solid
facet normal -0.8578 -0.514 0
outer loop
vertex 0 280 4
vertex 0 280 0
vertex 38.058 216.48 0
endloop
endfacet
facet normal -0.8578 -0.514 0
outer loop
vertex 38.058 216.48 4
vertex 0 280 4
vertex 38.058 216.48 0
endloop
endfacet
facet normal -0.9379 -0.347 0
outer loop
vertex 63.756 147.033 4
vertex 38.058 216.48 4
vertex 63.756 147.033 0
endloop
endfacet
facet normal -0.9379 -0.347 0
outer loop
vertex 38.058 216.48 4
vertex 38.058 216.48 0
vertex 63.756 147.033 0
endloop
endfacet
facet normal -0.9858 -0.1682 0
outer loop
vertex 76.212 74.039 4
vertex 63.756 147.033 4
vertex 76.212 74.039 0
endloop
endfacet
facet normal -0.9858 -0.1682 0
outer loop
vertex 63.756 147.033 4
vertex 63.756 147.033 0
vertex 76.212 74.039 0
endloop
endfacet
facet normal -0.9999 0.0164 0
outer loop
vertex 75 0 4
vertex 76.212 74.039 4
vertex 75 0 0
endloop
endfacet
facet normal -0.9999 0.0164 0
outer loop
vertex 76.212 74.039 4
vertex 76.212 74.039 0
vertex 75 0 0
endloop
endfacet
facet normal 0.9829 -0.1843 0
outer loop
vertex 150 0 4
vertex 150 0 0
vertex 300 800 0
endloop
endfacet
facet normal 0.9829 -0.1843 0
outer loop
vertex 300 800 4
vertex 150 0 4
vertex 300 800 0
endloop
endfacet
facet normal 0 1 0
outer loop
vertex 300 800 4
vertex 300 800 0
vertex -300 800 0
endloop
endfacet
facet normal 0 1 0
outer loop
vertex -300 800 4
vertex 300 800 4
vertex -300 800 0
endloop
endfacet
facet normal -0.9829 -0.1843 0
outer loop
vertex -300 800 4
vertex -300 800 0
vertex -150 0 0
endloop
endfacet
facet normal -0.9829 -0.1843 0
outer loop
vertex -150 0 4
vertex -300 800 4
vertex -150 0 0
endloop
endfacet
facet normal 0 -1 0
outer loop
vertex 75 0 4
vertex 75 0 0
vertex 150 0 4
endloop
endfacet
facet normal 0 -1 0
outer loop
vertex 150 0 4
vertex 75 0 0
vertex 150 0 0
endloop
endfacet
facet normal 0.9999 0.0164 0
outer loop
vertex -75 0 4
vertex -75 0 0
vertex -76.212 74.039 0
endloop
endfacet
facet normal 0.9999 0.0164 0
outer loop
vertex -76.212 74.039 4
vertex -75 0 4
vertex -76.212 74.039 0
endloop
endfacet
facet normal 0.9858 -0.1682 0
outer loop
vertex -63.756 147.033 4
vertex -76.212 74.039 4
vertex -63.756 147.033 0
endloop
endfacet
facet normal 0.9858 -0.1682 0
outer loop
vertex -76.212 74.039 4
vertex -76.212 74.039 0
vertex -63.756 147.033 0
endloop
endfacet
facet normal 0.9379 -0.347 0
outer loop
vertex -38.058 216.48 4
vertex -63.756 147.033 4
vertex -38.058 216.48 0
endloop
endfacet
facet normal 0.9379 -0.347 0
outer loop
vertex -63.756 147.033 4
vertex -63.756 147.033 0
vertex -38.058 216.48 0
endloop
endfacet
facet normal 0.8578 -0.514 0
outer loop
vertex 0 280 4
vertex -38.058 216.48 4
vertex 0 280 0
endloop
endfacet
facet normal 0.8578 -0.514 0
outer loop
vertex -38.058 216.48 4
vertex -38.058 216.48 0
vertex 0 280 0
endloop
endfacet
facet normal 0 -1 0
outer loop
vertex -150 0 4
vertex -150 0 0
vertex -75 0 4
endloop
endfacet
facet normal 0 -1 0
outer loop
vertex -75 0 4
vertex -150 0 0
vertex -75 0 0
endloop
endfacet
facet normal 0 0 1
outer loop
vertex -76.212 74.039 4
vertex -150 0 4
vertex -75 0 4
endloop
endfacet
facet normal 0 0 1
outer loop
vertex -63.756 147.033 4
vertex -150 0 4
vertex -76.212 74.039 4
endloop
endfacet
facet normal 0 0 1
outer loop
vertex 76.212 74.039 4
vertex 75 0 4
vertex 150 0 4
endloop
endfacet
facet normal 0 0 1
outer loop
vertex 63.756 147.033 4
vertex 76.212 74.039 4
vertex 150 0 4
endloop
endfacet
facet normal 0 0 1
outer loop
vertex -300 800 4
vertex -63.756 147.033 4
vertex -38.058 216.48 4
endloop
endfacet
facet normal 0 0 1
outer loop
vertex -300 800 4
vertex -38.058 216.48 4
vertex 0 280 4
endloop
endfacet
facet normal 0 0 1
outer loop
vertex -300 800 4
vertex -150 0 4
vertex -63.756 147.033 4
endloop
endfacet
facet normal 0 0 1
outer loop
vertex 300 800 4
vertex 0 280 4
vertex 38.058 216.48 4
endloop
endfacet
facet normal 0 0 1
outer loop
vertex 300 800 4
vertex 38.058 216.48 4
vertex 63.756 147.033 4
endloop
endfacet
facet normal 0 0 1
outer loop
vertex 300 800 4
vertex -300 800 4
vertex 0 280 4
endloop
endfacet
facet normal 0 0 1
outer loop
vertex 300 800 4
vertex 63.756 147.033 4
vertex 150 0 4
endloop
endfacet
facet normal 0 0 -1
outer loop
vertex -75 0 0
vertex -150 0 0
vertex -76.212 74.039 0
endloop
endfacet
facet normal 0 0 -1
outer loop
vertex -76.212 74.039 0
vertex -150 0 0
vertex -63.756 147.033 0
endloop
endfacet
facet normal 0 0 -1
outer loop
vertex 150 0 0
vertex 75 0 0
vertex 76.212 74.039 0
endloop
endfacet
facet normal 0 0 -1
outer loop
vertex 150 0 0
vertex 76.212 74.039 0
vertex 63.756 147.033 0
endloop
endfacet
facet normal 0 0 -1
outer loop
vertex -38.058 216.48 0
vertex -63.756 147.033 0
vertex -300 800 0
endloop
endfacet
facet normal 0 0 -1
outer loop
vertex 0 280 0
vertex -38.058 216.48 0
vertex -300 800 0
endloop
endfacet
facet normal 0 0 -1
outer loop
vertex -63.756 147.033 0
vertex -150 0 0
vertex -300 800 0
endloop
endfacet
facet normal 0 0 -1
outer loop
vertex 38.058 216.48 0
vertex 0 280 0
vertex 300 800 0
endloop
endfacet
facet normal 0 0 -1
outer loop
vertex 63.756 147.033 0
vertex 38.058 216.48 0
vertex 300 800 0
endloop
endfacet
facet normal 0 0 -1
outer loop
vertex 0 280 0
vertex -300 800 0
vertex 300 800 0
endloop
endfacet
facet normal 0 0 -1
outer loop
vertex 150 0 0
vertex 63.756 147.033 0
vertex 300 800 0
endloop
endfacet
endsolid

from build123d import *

# Parameters (mm, degrees)
F1_DEPTH = 4


with BuildPart() as f1:
    # F0 (on Top) → F1 (new body)
    with BuildSketch(Plane.XY):
        with BuildLine():
            ThreePointArc((0, 280), (63.755767, 147.032795), (75, 0))
            Line((75, 0), (150, 0))
            Line((150, 0), (300, 800))
            Line((300, 800), (-300, 800))
            Line((-300, 800), (-150, 0))
            Line((-150, 0), (-75, 0))
            ThreePointArc((-75, 0), (-63.755767, 147.032795), (0, 280))
        make_face()
    extrude(amount=F1_DEPTH)


solid = f1.part
